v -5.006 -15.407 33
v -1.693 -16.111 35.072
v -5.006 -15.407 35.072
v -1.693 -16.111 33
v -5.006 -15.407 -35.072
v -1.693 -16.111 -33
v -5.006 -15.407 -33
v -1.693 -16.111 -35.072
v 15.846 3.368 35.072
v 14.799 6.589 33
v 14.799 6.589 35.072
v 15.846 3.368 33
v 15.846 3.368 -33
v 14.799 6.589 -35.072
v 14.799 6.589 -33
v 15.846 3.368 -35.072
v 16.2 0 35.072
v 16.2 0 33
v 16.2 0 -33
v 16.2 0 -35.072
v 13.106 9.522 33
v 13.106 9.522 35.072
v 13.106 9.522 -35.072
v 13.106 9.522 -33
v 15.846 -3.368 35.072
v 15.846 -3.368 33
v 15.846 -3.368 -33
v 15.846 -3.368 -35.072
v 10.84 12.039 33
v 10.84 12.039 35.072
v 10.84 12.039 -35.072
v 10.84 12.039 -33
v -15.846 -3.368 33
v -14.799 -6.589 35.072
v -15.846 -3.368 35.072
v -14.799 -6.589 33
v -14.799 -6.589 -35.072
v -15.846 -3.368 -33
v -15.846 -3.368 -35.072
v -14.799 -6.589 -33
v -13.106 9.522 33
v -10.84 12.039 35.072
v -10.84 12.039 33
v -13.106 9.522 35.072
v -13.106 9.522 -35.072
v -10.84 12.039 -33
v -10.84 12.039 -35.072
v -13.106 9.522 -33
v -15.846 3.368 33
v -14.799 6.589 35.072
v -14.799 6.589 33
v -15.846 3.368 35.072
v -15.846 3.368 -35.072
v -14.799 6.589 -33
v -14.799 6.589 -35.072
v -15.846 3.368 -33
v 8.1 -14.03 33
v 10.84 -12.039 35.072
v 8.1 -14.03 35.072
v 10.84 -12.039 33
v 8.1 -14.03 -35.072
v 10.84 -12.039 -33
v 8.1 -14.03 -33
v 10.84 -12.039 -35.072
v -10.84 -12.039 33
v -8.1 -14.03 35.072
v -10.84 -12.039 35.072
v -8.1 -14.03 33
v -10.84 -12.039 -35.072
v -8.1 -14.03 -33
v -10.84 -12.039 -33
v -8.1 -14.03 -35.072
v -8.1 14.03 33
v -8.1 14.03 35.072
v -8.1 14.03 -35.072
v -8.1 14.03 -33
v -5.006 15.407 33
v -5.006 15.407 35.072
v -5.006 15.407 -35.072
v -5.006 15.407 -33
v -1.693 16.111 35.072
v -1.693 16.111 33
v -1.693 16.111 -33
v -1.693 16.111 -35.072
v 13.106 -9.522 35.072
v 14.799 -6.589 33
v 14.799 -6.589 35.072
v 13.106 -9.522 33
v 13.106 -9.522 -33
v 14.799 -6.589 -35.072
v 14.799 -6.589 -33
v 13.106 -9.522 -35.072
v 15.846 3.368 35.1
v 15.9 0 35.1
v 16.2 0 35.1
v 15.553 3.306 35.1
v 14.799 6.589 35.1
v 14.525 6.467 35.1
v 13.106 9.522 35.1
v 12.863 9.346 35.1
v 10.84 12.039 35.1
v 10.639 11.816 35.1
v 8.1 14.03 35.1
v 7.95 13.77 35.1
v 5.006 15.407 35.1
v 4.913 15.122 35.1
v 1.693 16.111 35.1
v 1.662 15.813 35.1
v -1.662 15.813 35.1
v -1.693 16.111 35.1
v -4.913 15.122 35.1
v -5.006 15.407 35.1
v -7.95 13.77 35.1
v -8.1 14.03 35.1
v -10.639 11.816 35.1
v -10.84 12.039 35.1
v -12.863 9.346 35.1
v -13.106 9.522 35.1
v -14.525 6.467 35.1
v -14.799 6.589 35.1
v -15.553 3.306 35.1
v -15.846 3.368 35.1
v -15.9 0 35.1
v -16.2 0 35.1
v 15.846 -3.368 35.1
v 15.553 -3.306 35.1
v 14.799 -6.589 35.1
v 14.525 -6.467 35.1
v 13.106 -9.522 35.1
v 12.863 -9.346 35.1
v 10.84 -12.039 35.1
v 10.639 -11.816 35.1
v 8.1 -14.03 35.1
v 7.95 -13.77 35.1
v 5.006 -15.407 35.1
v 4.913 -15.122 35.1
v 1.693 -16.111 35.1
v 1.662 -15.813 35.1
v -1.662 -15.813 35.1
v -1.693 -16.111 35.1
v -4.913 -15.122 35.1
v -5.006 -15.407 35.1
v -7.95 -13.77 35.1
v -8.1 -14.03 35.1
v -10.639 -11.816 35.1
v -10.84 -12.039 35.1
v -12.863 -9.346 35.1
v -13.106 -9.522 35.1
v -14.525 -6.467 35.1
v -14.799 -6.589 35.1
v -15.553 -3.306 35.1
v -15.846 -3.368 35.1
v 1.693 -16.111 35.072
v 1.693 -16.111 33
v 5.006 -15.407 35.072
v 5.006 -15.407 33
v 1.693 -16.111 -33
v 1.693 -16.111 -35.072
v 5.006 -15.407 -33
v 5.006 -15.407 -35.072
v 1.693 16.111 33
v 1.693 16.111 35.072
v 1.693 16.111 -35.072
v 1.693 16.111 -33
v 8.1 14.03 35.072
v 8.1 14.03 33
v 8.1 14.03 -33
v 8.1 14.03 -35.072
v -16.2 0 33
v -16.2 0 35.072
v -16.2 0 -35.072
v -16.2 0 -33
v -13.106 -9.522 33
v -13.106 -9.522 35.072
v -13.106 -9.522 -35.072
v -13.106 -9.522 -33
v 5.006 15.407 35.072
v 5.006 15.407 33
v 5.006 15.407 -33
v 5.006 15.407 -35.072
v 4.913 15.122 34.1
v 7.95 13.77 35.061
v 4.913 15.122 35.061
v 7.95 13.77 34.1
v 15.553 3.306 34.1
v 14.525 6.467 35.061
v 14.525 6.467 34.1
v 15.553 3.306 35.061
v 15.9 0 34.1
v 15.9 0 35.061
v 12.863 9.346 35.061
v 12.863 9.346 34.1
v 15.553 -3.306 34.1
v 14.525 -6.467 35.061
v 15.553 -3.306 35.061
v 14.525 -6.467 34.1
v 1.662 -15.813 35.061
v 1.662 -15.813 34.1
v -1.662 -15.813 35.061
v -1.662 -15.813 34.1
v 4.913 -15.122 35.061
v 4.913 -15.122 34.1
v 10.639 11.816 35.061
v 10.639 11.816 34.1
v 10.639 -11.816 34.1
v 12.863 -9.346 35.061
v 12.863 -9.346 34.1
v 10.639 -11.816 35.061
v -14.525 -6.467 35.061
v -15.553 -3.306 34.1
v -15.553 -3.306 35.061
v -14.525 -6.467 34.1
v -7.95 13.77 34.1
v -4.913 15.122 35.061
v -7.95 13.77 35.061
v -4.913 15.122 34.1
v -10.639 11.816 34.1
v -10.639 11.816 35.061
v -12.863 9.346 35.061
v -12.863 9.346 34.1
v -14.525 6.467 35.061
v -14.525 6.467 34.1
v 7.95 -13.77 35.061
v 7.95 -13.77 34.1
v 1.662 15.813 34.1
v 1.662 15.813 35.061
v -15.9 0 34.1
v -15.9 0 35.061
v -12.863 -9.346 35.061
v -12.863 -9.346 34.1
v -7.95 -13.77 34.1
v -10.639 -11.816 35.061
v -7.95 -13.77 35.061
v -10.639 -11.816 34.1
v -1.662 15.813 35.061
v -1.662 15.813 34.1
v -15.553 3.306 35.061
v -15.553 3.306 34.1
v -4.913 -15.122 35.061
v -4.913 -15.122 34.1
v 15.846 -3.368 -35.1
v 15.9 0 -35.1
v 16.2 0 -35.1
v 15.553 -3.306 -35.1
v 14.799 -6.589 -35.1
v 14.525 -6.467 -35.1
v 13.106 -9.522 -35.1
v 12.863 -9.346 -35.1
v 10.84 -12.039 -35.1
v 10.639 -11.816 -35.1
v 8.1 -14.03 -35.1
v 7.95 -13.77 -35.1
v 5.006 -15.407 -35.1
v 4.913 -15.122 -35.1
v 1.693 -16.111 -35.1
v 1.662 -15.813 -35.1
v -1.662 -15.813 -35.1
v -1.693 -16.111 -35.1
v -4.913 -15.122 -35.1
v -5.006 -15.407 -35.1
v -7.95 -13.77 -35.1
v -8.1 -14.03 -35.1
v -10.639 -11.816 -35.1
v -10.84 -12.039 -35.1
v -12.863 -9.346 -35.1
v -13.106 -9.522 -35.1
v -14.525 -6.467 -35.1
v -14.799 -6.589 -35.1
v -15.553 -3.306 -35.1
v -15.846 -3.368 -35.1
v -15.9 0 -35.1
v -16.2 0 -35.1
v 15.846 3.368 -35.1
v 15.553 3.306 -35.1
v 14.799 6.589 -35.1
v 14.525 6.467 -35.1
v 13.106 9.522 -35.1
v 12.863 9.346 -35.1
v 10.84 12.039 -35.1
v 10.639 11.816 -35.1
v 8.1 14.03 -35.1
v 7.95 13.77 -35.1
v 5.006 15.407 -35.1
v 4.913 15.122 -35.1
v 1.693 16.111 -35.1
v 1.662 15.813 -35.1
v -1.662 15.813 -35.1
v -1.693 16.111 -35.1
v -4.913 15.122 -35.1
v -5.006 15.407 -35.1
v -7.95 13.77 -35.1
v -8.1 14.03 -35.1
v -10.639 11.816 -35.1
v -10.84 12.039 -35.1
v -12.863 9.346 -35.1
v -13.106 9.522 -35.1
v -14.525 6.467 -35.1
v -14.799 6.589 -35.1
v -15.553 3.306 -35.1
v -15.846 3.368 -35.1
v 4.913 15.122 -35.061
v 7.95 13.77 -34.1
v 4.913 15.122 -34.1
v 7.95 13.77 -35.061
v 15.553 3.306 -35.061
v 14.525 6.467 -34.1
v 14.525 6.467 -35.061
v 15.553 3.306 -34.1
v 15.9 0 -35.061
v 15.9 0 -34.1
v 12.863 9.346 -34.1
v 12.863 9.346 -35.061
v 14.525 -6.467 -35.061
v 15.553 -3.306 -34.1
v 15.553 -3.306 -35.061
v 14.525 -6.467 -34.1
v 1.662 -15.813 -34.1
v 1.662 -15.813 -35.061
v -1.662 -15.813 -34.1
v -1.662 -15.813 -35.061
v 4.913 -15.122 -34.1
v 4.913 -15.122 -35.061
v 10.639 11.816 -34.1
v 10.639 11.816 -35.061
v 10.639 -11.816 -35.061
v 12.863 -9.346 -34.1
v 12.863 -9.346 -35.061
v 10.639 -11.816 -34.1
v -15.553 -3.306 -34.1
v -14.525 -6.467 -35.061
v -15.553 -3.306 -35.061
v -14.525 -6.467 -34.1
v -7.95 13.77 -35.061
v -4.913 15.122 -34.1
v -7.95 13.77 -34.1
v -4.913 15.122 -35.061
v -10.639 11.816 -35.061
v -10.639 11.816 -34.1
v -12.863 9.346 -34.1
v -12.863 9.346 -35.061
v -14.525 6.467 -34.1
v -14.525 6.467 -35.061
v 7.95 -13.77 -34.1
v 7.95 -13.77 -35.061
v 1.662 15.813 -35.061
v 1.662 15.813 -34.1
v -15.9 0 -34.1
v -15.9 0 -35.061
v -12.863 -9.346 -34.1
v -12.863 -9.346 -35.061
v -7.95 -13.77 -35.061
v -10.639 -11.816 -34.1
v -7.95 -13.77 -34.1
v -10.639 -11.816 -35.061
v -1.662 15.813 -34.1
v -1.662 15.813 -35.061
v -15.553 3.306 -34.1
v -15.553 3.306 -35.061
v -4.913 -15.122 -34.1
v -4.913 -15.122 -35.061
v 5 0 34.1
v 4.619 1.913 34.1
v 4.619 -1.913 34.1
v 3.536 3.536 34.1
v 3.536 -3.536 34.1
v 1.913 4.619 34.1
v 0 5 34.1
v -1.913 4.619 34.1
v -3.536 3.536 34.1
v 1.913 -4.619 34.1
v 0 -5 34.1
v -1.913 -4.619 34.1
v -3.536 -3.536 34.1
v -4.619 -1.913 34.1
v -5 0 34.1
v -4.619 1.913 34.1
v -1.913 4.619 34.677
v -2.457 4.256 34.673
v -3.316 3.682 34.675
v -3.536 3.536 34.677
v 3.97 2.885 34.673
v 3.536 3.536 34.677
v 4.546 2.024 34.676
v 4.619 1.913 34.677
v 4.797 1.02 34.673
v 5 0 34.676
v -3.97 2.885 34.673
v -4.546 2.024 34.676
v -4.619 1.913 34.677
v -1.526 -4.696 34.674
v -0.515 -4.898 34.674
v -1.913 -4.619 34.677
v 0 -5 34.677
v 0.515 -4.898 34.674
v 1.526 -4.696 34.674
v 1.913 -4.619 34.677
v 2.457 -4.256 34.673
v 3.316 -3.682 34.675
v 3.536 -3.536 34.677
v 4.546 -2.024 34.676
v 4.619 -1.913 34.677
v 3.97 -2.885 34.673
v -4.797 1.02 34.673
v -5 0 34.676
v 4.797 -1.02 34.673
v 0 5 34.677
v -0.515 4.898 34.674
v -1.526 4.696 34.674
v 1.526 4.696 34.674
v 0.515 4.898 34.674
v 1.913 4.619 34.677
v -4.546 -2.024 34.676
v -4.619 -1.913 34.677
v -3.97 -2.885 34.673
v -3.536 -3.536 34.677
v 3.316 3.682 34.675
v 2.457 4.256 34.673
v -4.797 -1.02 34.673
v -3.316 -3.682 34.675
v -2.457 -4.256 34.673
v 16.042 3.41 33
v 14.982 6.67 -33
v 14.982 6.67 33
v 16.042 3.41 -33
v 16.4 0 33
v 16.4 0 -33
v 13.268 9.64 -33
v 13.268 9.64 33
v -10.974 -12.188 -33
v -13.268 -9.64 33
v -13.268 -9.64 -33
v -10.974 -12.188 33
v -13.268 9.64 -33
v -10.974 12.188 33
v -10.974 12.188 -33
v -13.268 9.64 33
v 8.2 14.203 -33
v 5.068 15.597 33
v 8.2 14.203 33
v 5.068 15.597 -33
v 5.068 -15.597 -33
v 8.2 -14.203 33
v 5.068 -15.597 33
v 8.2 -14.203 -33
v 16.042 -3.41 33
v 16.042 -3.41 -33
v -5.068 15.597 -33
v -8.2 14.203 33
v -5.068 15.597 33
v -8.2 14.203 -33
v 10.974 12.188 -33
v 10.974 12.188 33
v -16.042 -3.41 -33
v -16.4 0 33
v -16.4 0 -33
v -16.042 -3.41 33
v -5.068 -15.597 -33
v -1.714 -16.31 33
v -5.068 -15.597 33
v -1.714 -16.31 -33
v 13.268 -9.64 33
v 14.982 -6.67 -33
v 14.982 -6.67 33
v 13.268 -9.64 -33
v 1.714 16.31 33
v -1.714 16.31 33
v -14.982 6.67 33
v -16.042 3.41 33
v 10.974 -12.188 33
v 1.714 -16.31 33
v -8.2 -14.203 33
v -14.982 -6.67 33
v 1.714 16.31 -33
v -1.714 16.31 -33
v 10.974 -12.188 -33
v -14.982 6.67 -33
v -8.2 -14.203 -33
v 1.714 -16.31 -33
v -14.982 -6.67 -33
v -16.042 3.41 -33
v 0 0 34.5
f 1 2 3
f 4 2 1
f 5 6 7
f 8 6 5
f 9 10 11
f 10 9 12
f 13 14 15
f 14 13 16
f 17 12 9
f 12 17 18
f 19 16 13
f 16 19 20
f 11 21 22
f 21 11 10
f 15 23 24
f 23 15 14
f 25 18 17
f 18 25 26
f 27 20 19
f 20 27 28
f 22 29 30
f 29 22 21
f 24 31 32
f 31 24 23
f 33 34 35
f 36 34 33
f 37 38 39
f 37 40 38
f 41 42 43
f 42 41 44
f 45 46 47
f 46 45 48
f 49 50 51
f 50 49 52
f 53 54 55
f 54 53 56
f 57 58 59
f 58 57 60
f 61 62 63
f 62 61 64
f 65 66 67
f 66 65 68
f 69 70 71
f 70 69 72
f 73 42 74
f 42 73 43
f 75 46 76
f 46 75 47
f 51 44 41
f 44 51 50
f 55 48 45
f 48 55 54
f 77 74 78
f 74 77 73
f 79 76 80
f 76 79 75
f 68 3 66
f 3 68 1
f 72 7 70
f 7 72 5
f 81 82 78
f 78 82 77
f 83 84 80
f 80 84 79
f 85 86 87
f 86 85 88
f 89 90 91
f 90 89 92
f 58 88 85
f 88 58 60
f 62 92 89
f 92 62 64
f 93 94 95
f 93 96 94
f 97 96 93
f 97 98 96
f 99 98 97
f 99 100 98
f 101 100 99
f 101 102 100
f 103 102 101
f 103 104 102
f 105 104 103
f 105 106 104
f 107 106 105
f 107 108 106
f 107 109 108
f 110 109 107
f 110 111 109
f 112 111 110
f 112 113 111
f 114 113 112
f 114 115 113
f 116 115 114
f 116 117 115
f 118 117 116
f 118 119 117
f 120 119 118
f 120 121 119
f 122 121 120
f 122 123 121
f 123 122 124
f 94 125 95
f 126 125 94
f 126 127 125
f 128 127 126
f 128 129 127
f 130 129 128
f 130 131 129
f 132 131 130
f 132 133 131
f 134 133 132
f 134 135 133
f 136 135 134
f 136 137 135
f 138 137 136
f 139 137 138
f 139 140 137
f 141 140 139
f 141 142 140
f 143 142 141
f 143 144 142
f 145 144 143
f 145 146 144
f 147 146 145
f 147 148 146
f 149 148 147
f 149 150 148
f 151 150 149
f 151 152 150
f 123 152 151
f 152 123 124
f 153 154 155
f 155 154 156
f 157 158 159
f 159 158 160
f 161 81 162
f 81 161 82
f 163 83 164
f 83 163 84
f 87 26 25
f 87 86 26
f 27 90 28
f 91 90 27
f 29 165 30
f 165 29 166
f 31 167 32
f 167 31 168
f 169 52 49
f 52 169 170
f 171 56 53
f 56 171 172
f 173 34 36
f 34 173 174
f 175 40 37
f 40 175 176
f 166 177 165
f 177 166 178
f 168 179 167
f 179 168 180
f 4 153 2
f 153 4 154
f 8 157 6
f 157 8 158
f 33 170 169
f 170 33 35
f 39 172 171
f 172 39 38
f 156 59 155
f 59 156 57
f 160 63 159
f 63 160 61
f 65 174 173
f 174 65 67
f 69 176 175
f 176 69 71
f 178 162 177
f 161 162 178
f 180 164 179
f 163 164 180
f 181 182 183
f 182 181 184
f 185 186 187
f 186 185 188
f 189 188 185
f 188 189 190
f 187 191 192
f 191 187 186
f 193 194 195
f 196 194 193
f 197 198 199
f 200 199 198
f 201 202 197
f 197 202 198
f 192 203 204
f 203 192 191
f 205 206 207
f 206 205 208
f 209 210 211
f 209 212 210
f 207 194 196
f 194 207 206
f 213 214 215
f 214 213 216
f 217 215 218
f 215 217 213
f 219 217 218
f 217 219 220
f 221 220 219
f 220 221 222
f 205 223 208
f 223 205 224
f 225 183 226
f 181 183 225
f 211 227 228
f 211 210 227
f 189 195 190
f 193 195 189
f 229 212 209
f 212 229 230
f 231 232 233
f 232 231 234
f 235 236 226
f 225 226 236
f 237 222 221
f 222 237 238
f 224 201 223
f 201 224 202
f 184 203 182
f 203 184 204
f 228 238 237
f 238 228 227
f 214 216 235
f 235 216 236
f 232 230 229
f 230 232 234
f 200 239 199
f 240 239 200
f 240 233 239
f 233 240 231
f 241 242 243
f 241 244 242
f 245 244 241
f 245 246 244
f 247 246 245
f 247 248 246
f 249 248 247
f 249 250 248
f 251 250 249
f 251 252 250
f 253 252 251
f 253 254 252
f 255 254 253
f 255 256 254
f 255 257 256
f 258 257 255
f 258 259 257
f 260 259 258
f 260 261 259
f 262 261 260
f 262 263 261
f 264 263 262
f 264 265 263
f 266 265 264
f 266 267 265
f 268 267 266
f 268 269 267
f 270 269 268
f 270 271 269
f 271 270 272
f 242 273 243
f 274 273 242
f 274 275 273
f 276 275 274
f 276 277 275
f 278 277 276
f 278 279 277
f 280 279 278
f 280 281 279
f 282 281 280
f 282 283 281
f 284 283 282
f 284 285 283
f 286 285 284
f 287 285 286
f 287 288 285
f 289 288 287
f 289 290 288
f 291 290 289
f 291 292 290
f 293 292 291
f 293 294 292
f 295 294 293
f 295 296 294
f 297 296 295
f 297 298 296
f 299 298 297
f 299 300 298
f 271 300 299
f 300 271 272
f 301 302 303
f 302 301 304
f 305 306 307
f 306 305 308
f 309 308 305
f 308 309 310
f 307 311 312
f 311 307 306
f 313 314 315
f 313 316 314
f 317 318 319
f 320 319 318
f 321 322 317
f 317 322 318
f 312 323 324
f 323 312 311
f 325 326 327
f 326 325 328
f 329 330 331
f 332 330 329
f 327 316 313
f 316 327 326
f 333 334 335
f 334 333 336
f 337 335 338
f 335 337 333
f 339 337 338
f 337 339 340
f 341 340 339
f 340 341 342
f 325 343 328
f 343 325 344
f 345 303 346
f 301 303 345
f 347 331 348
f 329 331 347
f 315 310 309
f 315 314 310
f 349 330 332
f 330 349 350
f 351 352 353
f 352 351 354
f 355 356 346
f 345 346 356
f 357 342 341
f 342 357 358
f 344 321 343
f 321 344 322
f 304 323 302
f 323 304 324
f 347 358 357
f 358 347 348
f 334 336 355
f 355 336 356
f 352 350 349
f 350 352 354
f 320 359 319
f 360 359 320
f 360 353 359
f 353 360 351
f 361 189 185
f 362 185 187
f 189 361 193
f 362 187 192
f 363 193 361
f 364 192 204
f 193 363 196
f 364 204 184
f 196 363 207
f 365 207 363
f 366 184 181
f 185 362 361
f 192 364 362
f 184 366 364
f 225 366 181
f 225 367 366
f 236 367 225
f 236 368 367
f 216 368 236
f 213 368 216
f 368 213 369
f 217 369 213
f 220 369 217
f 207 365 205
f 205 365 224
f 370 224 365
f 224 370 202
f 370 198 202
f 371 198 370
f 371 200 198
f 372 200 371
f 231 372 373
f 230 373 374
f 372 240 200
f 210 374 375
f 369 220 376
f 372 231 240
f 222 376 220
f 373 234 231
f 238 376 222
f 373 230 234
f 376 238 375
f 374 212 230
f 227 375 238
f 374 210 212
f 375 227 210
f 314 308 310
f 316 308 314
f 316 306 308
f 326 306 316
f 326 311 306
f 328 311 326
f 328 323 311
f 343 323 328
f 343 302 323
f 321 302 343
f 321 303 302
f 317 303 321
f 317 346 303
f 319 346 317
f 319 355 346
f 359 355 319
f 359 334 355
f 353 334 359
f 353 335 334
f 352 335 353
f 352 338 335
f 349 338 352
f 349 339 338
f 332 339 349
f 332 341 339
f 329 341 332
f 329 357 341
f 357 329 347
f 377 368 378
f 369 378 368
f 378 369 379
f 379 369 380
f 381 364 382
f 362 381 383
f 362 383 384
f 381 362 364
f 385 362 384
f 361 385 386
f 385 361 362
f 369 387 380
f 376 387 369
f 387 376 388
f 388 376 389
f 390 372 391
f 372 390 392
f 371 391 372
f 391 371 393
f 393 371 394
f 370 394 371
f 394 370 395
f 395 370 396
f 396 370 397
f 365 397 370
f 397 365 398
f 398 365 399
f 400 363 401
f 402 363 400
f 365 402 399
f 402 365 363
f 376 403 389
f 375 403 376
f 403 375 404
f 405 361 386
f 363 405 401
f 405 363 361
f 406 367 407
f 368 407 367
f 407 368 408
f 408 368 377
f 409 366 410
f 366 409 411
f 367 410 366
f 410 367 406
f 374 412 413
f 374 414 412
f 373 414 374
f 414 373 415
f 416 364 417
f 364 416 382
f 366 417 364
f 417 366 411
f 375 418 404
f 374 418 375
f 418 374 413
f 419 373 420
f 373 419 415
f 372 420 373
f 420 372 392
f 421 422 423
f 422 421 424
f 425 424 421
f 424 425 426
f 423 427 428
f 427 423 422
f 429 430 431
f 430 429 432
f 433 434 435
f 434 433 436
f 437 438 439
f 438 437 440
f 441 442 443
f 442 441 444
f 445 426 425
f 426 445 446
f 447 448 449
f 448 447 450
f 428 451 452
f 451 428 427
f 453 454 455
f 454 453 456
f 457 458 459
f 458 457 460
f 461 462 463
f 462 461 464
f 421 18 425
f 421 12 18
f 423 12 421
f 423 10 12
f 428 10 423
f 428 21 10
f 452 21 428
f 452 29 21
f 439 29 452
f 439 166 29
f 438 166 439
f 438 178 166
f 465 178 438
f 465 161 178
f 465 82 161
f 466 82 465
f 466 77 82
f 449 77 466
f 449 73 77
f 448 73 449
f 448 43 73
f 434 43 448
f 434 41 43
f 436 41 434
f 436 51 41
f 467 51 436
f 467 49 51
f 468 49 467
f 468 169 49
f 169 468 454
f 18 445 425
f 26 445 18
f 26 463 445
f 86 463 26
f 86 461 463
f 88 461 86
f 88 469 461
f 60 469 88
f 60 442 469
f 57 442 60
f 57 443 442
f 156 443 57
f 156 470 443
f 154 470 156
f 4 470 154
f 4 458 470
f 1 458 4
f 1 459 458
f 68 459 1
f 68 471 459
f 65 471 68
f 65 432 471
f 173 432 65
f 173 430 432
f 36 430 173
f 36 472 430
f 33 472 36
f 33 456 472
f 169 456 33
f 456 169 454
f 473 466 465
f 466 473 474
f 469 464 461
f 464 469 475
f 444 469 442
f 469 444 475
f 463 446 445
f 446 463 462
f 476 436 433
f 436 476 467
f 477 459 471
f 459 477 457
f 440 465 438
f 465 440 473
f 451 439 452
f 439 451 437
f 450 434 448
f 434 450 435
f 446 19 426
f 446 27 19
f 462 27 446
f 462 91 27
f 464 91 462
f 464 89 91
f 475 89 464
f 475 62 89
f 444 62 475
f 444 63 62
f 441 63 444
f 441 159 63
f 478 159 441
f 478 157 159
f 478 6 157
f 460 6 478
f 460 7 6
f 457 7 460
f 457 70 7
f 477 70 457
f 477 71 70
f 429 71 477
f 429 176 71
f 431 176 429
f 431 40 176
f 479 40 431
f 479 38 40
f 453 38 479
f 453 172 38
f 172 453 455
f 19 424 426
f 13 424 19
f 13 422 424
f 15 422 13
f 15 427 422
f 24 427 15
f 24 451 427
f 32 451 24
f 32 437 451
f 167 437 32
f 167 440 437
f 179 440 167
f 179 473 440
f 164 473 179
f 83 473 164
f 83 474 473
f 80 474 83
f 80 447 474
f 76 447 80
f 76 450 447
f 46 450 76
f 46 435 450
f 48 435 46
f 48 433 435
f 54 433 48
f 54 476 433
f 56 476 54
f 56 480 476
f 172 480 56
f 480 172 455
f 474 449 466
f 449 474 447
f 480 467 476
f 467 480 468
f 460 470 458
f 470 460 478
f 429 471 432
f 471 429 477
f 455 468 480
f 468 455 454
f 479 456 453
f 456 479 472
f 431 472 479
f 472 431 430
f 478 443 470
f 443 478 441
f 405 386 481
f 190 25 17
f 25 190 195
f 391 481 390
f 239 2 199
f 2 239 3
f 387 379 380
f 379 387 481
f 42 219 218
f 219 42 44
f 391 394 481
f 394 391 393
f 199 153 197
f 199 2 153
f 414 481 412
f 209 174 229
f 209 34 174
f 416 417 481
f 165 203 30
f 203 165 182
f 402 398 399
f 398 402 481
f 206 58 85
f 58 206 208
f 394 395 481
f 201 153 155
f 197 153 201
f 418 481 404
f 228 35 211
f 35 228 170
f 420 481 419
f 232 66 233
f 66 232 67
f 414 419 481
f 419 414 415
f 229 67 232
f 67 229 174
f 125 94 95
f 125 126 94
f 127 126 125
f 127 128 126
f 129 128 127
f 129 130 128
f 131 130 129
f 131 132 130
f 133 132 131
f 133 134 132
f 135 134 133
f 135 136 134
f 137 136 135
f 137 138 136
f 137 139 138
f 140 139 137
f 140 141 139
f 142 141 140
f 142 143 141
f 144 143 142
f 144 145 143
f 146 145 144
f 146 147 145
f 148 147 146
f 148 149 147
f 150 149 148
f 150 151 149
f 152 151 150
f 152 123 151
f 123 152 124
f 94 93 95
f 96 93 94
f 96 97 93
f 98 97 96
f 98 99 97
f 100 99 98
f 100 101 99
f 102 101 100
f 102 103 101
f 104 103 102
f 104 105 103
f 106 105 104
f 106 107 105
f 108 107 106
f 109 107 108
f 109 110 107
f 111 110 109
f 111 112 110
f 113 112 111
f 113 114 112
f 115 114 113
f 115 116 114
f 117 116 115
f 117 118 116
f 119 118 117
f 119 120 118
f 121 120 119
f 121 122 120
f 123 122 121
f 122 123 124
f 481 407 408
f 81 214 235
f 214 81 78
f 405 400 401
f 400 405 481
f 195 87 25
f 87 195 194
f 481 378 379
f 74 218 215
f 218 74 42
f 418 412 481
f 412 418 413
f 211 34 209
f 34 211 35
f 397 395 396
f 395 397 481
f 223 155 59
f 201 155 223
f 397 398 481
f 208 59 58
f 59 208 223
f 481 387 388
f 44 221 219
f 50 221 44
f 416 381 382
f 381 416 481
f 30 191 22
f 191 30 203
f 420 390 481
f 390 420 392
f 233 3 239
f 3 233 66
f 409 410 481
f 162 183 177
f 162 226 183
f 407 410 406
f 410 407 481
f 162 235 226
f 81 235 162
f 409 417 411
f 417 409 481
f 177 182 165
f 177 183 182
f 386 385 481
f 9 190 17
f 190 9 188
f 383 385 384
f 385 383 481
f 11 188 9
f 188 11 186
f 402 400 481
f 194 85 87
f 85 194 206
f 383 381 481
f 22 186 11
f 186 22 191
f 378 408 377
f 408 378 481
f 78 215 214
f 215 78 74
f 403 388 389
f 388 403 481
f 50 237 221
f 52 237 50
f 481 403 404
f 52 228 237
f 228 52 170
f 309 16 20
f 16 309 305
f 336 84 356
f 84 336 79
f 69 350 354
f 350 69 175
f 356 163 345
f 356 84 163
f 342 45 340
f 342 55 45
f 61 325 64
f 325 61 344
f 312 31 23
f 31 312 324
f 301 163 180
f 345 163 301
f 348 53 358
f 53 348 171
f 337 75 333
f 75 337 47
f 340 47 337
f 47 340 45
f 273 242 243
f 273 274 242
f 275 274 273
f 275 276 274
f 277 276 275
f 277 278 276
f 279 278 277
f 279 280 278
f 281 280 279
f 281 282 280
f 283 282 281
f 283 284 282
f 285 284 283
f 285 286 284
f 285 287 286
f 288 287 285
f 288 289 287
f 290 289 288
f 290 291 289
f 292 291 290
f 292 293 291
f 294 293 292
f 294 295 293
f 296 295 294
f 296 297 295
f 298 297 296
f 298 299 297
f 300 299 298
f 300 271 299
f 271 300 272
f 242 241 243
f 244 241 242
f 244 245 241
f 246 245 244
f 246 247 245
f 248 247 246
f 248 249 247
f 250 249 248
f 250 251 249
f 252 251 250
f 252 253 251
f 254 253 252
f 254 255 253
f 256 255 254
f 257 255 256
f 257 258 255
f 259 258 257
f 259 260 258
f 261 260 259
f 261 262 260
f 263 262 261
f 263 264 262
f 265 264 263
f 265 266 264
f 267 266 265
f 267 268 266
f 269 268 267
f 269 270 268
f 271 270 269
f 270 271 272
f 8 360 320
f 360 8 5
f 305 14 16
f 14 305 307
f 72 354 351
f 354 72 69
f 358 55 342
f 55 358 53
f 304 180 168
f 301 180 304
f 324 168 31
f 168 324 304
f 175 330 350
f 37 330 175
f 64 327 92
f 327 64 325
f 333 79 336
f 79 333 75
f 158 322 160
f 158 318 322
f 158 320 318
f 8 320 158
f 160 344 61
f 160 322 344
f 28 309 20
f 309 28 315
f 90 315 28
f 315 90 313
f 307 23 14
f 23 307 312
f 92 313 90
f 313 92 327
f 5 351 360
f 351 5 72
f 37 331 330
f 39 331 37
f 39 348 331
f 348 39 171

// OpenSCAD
// Parameters
cell_height = 70.2; //[35.1:140.4:0.1]
cell_diameter = 32.4; //[16.2:64.8:0.1]
cap_height = 1.0; //[0.5:2.0:0.1]
cap_lip_depth = 0.3; //[0.15:0.6:0.05]
overlap = 0.8; //[0.5:2.0:0.1]
button_diameter = 10.0; //[5.0:20.0:0.1]
button_height = 1.6; //[0.8:3.2:0.1]
insulator_outer_diameter = 18.0; //[9.0:36.0:0.1]
insulator_thickness = 0.6; //[0.3:1.2:0.05]
insulator_height = 0.4; //[0.2:1.0:0.05]
label_thickness = 0.2; //[0.1:0.6:0.05]
label_height = 66.0; //[33.0:132.0:0.1]
edge_chamfer = 0.6; //[0.3:1.5:0.1]

// Base Shapes
module cell_body() {
  color("DimGray")
  cylinder(h = cell_height - 2 * cap_height, r = cell_diameter / 2, center = true);
}

module top_cap_main() {
  cylinder(h = cap_height + overlap, r = cell_diameter / 2, center = true);
}

module top_cap_lip() {
  cylinder(h = cap_height + overlap, r = cell_diameter / 2 - cap_lip_depth, center = true);
}

module bottom_cap_main() {
  cylinder(h = cap_height + overlap, r = cell_diameter / 2, center = true);
}

module bottom_cap_lip() {
  cylinder(h = cap_height + overlap, r = cell_diameter / 2 - cap_lip_depth, center = true);
}

module positive_terminal_button() {
  color("Silver")
  cylinder(h = button_height, r = button_diameter / 2, center = true);
}

module insulator_ring_outer() {
  color("Black")
  cylinder(h = insulator_height, r = insulator_outer_diameter / 2, center = true);
}

module insulator_ring_inner_cut() {
  cylinder(h = insulator_height + 2 * overlap, r = insulator_outer_diameter / 2 - insulator_thickness, center = true);
}

module label_wrap() {
  color("LightGray")
  cylinder(h = label_height, r = cell_diameter / 2 + label_thickness, center = true);
}

module chamfer_cut_top() {
  rotate([180, 0, 0])
  cylinder(h = edge_chamfer, r1 = cell_diameter / 2 + label_thickness + edge_chamfer, r2 = 0, center = true);
}

module chamfer_cut_bottom() {
  cylinder(h = edge_chamfer, r1 = cell_diameter / 2 + label_thickness + edge_chamfer, r2 = 0, center = true);
}

// Operations
module top_cap() {
  difference() {
    top_cap_main();
    top_cap_lip();
  }
}

module bottom_cap() {
  difference() {
    bottom_cap_main();
    bottom_cap_lip();
  }
}

module insulator_ring() {
  difference() {
    insulator_ring_outer();
    insulator_ring_inner_cut();
  }
}

module battery_raw_union() {
  union() {
    cell_body();
    translate([0, 0, (cell_height - 2 * cap_height) / 2 + (cap_height + overlap) / 2 - overlap]) top_cap();
    translate([0, 0, -(cell_height - 2 * cap_height) / 2 - (cap_height + overlap) / 2 + overlap]) bottom_cap();
    translate([0, 0, cell_height / 2 - cap_height + button_height / 2 - overlap]) positive_terminal_button();
    translate([0, 0, cell_height / 2 - cap_height + insulator_height / 2 - overlap]) insulator_ring();
    label_wrap();
  }
}

module edge_fillets_chamfers() {
  difference() {
    battery_raw_union();
    translate([0, 0, cell_height / 2 - edge_chamfer / 2]) chamfer_cut_top();
    translate([0, 0, -cell_height / 2 + edge_chamfer / 2]) chamfer_cut_bottom();
  }
}

// Final Output
edge_fillets_chamfers();
